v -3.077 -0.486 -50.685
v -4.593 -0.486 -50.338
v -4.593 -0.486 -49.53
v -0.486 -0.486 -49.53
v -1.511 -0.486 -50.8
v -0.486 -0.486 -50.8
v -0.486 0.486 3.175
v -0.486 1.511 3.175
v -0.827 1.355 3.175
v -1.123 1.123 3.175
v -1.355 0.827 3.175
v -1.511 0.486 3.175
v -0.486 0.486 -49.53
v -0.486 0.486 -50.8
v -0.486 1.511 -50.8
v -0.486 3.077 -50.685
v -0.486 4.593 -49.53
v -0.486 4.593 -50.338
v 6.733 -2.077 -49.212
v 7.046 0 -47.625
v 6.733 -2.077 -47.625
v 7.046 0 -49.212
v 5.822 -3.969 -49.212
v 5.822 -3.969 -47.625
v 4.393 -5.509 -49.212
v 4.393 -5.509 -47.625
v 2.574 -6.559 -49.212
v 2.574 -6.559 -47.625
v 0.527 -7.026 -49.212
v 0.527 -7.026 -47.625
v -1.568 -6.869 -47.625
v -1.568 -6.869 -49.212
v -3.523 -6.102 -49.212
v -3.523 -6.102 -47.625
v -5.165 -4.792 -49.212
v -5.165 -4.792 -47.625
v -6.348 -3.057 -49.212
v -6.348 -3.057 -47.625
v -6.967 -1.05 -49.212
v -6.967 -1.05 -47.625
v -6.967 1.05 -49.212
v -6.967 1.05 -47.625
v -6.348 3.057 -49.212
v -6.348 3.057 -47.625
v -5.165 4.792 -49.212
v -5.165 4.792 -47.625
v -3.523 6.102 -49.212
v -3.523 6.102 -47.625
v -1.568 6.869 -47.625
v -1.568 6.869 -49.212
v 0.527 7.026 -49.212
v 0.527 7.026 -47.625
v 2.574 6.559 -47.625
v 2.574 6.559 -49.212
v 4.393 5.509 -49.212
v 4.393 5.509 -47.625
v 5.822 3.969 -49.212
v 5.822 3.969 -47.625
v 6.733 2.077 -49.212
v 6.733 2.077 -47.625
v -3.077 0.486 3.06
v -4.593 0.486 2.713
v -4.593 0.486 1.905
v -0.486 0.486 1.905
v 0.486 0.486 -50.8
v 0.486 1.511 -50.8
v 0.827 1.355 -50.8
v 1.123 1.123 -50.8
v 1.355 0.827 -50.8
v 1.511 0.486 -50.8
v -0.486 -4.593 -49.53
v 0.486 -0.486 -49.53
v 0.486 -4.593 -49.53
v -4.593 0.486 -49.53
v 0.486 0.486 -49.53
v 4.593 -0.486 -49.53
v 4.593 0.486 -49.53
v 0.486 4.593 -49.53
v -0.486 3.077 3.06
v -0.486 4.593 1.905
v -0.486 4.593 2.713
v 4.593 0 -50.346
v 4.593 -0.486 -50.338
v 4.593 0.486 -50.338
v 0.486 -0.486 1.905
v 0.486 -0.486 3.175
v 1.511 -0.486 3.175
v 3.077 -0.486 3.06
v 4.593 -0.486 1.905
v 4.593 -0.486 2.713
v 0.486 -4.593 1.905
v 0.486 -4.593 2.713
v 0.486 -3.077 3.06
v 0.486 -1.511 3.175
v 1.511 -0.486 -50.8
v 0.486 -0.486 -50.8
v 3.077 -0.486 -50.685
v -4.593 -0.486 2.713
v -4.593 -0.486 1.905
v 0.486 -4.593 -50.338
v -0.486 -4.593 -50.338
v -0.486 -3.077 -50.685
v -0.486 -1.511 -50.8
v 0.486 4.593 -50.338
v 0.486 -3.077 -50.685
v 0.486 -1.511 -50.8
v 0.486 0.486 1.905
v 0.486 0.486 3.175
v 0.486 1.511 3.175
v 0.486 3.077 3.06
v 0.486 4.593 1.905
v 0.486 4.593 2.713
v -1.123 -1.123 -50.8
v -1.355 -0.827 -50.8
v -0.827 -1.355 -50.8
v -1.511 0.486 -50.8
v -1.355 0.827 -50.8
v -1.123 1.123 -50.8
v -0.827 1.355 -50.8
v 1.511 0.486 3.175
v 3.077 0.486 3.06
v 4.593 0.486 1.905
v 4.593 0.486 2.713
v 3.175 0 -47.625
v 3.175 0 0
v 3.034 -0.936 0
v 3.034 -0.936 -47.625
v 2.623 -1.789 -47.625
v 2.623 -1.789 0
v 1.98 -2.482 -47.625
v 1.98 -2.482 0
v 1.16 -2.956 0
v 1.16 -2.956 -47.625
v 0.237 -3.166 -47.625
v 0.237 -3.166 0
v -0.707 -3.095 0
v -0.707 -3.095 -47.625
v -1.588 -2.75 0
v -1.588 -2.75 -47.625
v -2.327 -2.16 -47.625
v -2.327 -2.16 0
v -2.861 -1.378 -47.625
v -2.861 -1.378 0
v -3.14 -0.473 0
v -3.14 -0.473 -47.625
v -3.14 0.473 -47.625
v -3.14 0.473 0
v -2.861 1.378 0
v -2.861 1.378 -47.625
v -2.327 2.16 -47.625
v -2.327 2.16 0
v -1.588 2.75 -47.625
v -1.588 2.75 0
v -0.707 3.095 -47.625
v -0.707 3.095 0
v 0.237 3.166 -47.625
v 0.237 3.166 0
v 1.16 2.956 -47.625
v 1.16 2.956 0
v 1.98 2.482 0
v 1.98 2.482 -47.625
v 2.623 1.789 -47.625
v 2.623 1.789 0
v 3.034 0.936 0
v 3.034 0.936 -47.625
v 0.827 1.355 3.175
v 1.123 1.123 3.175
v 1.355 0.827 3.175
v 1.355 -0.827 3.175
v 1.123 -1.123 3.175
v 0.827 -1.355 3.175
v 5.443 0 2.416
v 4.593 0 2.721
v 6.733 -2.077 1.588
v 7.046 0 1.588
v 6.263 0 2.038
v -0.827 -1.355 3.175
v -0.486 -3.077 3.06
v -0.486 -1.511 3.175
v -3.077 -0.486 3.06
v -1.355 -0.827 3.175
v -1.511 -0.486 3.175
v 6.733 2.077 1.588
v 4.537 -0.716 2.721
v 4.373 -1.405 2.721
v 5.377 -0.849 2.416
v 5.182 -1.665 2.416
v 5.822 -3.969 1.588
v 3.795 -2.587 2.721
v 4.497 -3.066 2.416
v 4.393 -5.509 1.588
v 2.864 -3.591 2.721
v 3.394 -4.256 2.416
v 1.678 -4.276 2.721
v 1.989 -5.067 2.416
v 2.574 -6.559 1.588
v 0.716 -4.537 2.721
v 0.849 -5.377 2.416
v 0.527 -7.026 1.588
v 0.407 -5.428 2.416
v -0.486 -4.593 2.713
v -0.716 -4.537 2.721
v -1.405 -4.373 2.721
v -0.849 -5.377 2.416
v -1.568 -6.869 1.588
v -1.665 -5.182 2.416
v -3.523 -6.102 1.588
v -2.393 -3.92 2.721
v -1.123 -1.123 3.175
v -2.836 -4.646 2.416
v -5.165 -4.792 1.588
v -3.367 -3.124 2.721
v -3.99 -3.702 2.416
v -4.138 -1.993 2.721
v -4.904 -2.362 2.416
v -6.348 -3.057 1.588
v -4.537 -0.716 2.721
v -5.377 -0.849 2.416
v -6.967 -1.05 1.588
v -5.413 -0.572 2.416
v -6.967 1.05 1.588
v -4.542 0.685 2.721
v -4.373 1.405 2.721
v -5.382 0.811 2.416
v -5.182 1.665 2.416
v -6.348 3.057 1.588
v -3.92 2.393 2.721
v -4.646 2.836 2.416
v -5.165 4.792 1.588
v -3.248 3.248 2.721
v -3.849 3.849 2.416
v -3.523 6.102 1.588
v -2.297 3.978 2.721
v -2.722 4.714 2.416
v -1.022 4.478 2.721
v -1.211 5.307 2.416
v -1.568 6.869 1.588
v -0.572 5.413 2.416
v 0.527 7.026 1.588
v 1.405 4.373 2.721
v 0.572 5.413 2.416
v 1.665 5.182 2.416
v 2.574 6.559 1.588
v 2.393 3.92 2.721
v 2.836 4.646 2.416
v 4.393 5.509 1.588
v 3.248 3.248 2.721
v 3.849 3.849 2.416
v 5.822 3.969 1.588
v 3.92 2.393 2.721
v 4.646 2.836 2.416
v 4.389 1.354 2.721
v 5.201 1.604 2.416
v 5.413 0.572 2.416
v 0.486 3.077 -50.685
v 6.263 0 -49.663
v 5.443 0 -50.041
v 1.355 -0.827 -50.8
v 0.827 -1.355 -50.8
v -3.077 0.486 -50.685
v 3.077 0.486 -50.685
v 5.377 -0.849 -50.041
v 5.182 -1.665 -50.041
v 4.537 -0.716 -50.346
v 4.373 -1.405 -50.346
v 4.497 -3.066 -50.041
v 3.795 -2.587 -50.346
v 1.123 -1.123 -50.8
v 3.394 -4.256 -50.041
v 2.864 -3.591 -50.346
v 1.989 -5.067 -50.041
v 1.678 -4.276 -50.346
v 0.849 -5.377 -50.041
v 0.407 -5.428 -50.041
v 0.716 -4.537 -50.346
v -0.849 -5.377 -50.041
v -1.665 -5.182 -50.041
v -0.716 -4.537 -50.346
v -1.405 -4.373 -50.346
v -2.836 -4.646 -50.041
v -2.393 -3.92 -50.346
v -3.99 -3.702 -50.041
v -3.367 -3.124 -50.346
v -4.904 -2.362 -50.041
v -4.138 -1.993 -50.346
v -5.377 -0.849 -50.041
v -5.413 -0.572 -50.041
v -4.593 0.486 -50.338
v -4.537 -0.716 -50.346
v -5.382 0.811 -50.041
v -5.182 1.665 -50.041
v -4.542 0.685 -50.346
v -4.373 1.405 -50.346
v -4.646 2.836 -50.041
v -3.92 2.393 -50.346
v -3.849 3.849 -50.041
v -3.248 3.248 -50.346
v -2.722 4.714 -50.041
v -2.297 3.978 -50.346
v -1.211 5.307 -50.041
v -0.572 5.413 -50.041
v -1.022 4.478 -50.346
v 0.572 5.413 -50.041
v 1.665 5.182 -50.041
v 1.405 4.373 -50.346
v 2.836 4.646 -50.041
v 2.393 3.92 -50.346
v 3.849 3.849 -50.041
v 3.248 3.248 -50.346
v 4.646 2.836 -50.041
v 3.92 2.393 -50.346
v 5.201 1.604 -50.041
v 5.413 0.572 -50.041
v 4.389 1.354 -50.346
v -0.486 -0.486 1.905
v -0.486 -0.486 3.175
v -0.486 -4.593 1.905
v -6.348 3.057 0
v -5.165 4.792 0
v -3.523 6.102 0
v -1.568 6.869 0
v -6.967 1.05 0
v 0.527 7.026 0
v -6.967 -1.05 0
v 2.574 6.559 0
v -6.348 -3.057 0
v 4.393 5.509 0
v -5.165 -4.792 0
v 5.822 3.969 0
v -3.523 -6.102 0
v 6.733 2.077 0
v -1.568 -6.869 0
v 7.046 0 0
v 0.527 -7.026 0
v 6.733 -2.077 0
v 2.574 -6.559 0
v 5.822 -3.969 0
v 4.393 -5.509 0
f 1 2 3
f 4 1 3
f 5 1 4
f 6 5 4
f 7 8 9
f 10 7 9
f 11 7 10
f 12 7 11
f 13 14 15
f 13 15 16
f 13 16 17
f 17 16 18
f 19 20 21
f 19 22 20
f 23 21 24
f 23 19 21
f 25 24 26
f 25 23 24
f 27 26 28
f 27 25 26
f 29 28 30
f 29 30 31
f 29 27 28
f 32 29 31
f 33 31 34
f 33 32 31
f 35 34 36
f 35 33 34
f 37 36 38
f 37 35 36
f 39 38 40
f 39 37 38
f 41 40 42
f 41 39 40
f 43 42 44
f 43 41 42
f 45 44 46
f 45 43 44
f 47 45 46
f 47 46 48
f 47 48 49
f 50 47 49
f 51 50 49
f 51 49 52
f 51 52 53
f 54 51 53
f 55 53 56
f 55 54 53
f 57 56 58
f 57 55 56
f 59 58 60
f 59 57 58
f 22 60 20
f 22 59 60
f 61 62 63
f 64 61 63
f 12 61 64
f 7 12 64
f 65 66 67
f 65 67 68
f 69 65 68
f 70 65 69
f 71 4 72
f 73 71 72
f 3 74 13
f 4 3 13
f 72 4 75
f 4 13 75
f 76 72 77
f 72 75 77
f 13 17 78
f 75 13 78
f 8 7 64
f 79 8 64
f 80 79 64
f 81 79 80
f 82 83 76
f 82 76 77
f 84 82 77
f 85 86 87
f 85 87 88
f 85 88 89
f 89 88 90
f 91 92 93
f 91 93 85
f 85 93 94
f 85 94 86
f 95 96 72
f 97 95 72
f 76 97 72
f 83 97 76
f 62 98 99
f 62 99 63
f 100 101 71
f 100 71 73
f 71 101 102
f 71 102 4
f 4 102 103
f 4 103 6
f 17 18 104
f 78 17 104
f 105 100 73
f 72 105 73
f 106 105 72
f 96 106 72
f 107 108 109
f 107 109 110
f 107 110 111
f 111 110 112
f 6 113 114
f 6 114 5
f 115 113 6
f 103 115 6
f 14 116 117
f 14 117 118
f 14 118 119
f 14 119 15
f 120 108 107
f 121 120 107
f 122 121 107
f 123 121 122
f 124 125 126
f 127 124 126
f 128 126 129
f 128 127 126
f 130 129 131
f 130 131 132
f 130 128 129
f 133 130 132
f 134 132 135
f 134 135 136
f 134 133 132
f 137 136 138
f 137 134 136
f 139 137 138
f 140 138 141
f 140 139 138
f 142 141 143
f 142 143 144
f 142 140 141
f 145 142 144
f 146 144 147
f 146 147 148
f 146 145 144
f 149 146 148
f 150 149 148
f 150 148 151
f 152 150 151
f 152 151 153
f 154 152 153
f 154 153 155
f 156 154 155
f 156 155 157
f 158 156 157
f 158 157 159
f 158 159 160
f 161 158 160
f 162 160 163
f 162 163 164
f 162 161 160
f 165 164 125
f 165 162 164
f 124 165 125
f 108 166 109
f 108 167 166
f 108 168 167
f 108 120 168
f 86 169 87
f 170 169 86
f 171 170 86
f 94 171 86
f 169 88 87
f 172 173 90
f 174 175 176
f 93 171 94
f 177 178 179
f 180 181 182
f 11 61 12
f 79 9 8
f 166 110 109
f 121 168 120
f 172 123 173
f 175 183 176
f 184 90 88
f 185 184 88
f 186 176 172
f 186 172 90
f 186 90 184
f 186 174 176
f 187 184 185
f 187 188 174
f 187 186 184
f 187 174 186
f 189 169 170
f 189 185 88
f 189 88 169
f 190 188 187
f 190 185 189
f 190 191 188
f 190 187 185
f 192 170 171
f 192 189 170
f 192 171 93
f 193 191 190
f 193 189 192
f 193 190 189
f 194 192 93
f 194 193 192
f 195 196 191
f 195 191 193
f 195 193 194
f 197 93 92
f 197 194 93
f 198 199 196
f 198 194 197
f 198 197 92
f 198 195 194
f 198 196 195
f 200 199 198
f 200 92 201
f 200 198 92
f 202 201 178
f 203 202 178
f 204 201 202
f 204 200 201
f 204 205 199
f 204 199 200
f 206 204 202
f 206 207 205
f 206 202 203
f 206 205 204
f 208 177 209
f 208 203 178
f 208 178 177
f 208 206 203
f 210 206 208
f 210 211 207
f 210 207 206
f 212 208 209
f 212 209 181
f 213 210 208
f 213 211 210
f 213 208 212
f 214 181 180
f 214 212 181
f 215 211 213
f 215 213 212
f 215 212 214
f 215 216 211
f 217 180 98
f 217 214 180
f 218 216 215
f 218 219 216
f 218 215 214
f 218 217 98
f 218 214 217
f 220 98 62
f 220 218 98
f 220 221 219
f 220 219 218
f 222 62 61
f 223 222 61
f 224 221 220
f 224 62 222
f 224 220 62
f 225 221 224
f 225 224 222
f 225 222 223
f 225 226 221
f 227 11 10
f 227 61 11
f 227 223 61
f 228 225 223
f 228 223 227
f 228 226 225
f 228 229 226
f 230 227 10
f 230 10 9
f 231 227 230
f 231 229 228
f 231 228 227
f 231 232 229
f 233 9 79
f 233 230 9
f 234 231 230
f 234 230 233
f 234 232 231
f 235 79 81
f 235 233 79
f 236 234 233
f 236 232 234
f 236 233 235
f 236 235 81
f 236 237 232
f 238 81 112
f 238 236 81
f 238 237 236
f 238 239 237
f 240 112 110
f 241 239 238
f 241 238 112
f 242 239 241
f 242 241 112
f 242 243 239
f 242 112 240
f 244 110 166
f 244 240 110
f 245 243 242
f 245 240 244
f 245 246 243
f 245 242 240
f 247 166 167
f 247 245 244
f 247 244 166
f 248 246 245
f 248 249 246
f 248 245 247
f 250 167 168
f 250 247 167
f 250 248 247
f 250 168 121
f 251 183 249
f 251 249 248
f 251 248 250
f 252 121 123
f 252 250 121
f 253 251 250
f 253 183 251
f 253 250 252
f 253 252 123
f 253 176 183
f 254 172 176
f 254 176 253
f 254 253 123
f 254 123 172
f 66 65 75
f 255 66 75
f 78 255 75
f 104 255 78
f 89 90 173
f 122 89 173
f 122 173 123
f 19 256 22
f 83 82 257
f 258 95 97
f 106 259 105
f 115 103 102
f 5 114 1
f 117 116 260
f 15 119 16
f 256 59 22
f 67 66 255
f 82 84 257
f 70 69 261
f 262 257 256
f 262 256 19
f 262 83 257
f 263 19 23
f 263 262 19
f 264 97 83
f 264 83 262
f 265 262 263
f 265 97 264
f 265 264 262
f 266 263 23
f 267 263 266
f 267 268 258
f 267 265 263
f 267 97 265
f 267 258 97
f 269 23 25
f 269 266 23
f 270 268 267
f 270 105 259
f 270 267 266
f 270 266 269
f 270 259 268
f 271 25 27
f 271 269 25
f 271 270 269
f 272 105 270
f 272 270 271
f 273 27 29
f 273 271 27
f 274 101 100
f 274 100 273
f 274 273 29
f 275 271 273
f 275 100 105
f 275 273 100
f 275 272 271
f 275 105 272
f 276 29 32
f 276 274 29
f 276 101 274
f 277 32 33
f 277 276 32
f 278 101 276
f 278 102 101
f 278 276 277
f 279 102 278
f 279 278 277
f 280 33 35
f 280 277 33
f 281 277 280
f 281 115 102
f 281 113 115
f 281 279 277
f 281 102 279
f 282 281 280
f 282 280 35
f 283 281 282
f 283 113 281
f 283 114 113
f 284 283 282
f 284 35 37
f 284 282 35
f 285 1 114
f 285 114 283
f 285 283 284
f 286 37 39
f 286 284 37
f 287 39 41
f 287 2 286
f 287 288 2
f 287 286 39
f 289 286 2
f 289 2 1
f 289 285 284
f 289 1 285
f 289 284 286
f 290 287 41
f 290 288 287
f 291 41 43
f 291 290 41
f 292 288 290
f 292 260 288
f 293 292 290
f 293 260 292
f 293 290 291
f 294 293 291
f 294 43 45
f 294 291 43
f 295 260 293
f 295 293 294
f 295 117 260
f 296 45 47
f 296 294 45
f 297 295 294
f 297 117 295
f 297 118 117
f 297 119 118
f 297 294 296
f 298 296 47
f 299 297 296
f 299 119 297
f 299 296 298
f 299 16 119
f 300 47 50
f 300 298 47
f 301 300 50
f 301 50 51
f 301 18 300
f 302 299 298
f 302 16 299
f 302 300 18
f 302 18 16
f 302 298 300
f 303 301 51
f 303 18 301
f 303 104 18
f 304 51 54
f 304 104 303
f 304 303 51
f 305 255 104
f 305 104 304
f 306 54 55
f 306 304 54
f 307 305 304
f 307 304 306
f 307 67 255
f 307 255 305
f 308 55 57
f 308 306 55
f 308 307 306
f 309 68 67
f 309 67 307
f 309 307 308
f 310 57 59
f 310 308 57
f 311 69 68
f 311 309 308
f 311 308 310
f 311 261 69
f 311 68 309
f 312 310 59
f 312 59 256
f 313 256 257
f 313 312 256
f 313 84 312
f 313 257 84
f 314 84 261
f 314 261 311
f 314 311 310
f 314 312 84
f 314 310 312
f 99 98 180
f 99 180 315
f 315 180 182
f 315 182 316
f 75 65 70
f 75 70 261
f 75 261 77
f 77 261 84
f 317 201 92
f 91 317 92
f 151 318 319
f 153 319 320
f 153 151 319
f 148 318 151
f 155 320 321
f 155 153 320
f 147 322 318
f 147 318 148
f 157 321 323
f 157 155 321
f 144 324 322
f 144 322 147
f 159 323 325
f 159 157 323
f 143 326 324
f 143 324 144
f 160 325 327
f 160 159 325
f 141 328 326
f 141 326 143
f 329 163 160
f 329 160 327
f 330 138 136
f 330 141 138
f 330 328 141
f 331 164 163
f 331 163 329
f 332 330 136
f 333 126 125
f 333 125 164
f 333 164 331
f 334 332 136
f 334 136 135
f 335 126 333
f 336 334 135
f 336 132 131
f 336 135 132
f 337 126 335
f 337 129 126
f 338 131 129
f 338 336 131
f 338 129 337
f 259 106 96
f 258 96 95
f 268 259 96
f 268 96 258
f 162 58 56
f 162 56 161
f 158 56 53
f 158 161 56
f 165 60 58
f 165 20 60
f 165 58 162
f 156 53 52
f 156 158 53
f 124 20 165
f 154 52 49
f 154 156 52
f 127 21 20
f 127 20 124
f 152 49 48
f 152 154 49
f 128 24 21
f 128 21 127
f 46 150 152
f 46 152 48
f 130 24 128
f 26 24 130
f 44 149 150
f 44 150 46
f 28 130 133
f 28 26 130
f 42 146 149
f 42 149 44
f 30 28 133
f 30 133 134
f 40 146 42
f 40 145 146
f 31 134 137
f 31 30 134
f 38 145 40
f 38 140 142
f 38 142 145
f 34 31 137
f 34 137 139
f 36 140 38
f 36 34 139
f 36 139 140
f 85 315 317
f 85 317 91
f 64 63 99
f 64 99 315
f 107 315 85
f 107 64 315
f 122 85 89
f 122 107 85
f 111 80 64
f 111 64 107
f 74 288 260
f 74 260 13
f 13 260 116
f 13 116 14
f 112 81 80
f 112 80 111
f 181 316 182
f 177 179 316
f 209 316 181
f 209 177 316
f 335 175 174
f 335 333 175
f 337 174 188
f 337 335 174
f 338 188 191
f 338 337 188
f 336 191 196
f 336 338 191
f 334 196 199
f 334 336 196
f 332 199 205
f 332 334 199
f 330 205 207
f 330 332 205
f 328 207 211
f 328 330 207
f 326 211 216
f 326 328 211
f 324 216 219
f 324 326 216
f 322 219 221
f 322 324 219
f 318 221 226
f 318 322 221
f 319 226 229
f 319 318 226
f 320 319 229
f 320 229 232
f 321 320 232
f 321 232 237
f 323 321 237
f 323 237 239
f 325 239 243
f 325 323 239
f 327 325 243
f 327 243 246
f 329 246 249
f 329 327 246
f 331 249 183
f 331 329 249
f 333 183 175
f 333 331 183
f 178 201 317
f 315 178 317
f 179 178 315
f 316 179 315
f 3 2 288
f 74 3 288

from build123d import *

# Parameters (mm, degrees)
SKETCH2_W          = 9.186415934
SKETCH2_H          = 0.97118121
SKETCH2_W_2        = 0.97118121
SKETCH2_H_2        = 9.186415934
CUT_EXTRUDE1_DEPTH = 1.27


with BuildPart() as part:
    # Sketch1 → Revolve1 (revolve)
    with BuildSketch(Plane(origin=(0, 0, 0), x_dir=(1, 0, 0), z_dir=(0, 1, 0))):
        with BuildLine():
            Line((0, 47.625), (0, 0))
            Line((0, 0), (0, -3.175))
            Line((0, -3.175), (1.5875, -3.175))
            ThreePointArc((1.5875, -3.175), (4.429777637, -2.770069708), (7.045889178, -1.5875))
            Line((7.045889178, -1.5875), (7.045889178, 0))
            Line((7.045889178, 0), (3.175, 0))
            Line((3.175, 0), (3.175, 47.625))
            Line((3.175, 47.625), (7.045889178, 47.625))
            Line((7.045889178, 47.625), (7.045889178, 49.2125))
            ThreePointArc((7.045889178, 49.2125), (4.429777637, 50.395069708), (1.5875, 50.8))
            Line((1.5875, 50.8), (0, 50.8))
            Line((0, 50.8), (0, 47.625))
        make_face()
    revolve(axis=Axis((0, 0, 0), (0, 0, -1)))

    # Sketch2 → Cut-Extrude1 (cut)
    with BuildSketch(Plane.XY.offset(3.175)):
        Rectangle(SKETCH2_W, SKETCH2_H)
        Rectangle(SKETCH2_W_2, SKETCH2_H_2)
    cut_extrude1 = extrude(amount=-CUT_EXTRUDE1_DEPTH, mode=Mode.SUBTRACT)

    # Mirror1: Cut-Extrude1 across plane
    add(cut_extrude1.mirror(Plane(origin=(0, 0, -23.8125), x_dir=(1, 0, 0), z_dir=(0, 0, -1))), mode=Mode.SUBTRACT)


solid = part.part
